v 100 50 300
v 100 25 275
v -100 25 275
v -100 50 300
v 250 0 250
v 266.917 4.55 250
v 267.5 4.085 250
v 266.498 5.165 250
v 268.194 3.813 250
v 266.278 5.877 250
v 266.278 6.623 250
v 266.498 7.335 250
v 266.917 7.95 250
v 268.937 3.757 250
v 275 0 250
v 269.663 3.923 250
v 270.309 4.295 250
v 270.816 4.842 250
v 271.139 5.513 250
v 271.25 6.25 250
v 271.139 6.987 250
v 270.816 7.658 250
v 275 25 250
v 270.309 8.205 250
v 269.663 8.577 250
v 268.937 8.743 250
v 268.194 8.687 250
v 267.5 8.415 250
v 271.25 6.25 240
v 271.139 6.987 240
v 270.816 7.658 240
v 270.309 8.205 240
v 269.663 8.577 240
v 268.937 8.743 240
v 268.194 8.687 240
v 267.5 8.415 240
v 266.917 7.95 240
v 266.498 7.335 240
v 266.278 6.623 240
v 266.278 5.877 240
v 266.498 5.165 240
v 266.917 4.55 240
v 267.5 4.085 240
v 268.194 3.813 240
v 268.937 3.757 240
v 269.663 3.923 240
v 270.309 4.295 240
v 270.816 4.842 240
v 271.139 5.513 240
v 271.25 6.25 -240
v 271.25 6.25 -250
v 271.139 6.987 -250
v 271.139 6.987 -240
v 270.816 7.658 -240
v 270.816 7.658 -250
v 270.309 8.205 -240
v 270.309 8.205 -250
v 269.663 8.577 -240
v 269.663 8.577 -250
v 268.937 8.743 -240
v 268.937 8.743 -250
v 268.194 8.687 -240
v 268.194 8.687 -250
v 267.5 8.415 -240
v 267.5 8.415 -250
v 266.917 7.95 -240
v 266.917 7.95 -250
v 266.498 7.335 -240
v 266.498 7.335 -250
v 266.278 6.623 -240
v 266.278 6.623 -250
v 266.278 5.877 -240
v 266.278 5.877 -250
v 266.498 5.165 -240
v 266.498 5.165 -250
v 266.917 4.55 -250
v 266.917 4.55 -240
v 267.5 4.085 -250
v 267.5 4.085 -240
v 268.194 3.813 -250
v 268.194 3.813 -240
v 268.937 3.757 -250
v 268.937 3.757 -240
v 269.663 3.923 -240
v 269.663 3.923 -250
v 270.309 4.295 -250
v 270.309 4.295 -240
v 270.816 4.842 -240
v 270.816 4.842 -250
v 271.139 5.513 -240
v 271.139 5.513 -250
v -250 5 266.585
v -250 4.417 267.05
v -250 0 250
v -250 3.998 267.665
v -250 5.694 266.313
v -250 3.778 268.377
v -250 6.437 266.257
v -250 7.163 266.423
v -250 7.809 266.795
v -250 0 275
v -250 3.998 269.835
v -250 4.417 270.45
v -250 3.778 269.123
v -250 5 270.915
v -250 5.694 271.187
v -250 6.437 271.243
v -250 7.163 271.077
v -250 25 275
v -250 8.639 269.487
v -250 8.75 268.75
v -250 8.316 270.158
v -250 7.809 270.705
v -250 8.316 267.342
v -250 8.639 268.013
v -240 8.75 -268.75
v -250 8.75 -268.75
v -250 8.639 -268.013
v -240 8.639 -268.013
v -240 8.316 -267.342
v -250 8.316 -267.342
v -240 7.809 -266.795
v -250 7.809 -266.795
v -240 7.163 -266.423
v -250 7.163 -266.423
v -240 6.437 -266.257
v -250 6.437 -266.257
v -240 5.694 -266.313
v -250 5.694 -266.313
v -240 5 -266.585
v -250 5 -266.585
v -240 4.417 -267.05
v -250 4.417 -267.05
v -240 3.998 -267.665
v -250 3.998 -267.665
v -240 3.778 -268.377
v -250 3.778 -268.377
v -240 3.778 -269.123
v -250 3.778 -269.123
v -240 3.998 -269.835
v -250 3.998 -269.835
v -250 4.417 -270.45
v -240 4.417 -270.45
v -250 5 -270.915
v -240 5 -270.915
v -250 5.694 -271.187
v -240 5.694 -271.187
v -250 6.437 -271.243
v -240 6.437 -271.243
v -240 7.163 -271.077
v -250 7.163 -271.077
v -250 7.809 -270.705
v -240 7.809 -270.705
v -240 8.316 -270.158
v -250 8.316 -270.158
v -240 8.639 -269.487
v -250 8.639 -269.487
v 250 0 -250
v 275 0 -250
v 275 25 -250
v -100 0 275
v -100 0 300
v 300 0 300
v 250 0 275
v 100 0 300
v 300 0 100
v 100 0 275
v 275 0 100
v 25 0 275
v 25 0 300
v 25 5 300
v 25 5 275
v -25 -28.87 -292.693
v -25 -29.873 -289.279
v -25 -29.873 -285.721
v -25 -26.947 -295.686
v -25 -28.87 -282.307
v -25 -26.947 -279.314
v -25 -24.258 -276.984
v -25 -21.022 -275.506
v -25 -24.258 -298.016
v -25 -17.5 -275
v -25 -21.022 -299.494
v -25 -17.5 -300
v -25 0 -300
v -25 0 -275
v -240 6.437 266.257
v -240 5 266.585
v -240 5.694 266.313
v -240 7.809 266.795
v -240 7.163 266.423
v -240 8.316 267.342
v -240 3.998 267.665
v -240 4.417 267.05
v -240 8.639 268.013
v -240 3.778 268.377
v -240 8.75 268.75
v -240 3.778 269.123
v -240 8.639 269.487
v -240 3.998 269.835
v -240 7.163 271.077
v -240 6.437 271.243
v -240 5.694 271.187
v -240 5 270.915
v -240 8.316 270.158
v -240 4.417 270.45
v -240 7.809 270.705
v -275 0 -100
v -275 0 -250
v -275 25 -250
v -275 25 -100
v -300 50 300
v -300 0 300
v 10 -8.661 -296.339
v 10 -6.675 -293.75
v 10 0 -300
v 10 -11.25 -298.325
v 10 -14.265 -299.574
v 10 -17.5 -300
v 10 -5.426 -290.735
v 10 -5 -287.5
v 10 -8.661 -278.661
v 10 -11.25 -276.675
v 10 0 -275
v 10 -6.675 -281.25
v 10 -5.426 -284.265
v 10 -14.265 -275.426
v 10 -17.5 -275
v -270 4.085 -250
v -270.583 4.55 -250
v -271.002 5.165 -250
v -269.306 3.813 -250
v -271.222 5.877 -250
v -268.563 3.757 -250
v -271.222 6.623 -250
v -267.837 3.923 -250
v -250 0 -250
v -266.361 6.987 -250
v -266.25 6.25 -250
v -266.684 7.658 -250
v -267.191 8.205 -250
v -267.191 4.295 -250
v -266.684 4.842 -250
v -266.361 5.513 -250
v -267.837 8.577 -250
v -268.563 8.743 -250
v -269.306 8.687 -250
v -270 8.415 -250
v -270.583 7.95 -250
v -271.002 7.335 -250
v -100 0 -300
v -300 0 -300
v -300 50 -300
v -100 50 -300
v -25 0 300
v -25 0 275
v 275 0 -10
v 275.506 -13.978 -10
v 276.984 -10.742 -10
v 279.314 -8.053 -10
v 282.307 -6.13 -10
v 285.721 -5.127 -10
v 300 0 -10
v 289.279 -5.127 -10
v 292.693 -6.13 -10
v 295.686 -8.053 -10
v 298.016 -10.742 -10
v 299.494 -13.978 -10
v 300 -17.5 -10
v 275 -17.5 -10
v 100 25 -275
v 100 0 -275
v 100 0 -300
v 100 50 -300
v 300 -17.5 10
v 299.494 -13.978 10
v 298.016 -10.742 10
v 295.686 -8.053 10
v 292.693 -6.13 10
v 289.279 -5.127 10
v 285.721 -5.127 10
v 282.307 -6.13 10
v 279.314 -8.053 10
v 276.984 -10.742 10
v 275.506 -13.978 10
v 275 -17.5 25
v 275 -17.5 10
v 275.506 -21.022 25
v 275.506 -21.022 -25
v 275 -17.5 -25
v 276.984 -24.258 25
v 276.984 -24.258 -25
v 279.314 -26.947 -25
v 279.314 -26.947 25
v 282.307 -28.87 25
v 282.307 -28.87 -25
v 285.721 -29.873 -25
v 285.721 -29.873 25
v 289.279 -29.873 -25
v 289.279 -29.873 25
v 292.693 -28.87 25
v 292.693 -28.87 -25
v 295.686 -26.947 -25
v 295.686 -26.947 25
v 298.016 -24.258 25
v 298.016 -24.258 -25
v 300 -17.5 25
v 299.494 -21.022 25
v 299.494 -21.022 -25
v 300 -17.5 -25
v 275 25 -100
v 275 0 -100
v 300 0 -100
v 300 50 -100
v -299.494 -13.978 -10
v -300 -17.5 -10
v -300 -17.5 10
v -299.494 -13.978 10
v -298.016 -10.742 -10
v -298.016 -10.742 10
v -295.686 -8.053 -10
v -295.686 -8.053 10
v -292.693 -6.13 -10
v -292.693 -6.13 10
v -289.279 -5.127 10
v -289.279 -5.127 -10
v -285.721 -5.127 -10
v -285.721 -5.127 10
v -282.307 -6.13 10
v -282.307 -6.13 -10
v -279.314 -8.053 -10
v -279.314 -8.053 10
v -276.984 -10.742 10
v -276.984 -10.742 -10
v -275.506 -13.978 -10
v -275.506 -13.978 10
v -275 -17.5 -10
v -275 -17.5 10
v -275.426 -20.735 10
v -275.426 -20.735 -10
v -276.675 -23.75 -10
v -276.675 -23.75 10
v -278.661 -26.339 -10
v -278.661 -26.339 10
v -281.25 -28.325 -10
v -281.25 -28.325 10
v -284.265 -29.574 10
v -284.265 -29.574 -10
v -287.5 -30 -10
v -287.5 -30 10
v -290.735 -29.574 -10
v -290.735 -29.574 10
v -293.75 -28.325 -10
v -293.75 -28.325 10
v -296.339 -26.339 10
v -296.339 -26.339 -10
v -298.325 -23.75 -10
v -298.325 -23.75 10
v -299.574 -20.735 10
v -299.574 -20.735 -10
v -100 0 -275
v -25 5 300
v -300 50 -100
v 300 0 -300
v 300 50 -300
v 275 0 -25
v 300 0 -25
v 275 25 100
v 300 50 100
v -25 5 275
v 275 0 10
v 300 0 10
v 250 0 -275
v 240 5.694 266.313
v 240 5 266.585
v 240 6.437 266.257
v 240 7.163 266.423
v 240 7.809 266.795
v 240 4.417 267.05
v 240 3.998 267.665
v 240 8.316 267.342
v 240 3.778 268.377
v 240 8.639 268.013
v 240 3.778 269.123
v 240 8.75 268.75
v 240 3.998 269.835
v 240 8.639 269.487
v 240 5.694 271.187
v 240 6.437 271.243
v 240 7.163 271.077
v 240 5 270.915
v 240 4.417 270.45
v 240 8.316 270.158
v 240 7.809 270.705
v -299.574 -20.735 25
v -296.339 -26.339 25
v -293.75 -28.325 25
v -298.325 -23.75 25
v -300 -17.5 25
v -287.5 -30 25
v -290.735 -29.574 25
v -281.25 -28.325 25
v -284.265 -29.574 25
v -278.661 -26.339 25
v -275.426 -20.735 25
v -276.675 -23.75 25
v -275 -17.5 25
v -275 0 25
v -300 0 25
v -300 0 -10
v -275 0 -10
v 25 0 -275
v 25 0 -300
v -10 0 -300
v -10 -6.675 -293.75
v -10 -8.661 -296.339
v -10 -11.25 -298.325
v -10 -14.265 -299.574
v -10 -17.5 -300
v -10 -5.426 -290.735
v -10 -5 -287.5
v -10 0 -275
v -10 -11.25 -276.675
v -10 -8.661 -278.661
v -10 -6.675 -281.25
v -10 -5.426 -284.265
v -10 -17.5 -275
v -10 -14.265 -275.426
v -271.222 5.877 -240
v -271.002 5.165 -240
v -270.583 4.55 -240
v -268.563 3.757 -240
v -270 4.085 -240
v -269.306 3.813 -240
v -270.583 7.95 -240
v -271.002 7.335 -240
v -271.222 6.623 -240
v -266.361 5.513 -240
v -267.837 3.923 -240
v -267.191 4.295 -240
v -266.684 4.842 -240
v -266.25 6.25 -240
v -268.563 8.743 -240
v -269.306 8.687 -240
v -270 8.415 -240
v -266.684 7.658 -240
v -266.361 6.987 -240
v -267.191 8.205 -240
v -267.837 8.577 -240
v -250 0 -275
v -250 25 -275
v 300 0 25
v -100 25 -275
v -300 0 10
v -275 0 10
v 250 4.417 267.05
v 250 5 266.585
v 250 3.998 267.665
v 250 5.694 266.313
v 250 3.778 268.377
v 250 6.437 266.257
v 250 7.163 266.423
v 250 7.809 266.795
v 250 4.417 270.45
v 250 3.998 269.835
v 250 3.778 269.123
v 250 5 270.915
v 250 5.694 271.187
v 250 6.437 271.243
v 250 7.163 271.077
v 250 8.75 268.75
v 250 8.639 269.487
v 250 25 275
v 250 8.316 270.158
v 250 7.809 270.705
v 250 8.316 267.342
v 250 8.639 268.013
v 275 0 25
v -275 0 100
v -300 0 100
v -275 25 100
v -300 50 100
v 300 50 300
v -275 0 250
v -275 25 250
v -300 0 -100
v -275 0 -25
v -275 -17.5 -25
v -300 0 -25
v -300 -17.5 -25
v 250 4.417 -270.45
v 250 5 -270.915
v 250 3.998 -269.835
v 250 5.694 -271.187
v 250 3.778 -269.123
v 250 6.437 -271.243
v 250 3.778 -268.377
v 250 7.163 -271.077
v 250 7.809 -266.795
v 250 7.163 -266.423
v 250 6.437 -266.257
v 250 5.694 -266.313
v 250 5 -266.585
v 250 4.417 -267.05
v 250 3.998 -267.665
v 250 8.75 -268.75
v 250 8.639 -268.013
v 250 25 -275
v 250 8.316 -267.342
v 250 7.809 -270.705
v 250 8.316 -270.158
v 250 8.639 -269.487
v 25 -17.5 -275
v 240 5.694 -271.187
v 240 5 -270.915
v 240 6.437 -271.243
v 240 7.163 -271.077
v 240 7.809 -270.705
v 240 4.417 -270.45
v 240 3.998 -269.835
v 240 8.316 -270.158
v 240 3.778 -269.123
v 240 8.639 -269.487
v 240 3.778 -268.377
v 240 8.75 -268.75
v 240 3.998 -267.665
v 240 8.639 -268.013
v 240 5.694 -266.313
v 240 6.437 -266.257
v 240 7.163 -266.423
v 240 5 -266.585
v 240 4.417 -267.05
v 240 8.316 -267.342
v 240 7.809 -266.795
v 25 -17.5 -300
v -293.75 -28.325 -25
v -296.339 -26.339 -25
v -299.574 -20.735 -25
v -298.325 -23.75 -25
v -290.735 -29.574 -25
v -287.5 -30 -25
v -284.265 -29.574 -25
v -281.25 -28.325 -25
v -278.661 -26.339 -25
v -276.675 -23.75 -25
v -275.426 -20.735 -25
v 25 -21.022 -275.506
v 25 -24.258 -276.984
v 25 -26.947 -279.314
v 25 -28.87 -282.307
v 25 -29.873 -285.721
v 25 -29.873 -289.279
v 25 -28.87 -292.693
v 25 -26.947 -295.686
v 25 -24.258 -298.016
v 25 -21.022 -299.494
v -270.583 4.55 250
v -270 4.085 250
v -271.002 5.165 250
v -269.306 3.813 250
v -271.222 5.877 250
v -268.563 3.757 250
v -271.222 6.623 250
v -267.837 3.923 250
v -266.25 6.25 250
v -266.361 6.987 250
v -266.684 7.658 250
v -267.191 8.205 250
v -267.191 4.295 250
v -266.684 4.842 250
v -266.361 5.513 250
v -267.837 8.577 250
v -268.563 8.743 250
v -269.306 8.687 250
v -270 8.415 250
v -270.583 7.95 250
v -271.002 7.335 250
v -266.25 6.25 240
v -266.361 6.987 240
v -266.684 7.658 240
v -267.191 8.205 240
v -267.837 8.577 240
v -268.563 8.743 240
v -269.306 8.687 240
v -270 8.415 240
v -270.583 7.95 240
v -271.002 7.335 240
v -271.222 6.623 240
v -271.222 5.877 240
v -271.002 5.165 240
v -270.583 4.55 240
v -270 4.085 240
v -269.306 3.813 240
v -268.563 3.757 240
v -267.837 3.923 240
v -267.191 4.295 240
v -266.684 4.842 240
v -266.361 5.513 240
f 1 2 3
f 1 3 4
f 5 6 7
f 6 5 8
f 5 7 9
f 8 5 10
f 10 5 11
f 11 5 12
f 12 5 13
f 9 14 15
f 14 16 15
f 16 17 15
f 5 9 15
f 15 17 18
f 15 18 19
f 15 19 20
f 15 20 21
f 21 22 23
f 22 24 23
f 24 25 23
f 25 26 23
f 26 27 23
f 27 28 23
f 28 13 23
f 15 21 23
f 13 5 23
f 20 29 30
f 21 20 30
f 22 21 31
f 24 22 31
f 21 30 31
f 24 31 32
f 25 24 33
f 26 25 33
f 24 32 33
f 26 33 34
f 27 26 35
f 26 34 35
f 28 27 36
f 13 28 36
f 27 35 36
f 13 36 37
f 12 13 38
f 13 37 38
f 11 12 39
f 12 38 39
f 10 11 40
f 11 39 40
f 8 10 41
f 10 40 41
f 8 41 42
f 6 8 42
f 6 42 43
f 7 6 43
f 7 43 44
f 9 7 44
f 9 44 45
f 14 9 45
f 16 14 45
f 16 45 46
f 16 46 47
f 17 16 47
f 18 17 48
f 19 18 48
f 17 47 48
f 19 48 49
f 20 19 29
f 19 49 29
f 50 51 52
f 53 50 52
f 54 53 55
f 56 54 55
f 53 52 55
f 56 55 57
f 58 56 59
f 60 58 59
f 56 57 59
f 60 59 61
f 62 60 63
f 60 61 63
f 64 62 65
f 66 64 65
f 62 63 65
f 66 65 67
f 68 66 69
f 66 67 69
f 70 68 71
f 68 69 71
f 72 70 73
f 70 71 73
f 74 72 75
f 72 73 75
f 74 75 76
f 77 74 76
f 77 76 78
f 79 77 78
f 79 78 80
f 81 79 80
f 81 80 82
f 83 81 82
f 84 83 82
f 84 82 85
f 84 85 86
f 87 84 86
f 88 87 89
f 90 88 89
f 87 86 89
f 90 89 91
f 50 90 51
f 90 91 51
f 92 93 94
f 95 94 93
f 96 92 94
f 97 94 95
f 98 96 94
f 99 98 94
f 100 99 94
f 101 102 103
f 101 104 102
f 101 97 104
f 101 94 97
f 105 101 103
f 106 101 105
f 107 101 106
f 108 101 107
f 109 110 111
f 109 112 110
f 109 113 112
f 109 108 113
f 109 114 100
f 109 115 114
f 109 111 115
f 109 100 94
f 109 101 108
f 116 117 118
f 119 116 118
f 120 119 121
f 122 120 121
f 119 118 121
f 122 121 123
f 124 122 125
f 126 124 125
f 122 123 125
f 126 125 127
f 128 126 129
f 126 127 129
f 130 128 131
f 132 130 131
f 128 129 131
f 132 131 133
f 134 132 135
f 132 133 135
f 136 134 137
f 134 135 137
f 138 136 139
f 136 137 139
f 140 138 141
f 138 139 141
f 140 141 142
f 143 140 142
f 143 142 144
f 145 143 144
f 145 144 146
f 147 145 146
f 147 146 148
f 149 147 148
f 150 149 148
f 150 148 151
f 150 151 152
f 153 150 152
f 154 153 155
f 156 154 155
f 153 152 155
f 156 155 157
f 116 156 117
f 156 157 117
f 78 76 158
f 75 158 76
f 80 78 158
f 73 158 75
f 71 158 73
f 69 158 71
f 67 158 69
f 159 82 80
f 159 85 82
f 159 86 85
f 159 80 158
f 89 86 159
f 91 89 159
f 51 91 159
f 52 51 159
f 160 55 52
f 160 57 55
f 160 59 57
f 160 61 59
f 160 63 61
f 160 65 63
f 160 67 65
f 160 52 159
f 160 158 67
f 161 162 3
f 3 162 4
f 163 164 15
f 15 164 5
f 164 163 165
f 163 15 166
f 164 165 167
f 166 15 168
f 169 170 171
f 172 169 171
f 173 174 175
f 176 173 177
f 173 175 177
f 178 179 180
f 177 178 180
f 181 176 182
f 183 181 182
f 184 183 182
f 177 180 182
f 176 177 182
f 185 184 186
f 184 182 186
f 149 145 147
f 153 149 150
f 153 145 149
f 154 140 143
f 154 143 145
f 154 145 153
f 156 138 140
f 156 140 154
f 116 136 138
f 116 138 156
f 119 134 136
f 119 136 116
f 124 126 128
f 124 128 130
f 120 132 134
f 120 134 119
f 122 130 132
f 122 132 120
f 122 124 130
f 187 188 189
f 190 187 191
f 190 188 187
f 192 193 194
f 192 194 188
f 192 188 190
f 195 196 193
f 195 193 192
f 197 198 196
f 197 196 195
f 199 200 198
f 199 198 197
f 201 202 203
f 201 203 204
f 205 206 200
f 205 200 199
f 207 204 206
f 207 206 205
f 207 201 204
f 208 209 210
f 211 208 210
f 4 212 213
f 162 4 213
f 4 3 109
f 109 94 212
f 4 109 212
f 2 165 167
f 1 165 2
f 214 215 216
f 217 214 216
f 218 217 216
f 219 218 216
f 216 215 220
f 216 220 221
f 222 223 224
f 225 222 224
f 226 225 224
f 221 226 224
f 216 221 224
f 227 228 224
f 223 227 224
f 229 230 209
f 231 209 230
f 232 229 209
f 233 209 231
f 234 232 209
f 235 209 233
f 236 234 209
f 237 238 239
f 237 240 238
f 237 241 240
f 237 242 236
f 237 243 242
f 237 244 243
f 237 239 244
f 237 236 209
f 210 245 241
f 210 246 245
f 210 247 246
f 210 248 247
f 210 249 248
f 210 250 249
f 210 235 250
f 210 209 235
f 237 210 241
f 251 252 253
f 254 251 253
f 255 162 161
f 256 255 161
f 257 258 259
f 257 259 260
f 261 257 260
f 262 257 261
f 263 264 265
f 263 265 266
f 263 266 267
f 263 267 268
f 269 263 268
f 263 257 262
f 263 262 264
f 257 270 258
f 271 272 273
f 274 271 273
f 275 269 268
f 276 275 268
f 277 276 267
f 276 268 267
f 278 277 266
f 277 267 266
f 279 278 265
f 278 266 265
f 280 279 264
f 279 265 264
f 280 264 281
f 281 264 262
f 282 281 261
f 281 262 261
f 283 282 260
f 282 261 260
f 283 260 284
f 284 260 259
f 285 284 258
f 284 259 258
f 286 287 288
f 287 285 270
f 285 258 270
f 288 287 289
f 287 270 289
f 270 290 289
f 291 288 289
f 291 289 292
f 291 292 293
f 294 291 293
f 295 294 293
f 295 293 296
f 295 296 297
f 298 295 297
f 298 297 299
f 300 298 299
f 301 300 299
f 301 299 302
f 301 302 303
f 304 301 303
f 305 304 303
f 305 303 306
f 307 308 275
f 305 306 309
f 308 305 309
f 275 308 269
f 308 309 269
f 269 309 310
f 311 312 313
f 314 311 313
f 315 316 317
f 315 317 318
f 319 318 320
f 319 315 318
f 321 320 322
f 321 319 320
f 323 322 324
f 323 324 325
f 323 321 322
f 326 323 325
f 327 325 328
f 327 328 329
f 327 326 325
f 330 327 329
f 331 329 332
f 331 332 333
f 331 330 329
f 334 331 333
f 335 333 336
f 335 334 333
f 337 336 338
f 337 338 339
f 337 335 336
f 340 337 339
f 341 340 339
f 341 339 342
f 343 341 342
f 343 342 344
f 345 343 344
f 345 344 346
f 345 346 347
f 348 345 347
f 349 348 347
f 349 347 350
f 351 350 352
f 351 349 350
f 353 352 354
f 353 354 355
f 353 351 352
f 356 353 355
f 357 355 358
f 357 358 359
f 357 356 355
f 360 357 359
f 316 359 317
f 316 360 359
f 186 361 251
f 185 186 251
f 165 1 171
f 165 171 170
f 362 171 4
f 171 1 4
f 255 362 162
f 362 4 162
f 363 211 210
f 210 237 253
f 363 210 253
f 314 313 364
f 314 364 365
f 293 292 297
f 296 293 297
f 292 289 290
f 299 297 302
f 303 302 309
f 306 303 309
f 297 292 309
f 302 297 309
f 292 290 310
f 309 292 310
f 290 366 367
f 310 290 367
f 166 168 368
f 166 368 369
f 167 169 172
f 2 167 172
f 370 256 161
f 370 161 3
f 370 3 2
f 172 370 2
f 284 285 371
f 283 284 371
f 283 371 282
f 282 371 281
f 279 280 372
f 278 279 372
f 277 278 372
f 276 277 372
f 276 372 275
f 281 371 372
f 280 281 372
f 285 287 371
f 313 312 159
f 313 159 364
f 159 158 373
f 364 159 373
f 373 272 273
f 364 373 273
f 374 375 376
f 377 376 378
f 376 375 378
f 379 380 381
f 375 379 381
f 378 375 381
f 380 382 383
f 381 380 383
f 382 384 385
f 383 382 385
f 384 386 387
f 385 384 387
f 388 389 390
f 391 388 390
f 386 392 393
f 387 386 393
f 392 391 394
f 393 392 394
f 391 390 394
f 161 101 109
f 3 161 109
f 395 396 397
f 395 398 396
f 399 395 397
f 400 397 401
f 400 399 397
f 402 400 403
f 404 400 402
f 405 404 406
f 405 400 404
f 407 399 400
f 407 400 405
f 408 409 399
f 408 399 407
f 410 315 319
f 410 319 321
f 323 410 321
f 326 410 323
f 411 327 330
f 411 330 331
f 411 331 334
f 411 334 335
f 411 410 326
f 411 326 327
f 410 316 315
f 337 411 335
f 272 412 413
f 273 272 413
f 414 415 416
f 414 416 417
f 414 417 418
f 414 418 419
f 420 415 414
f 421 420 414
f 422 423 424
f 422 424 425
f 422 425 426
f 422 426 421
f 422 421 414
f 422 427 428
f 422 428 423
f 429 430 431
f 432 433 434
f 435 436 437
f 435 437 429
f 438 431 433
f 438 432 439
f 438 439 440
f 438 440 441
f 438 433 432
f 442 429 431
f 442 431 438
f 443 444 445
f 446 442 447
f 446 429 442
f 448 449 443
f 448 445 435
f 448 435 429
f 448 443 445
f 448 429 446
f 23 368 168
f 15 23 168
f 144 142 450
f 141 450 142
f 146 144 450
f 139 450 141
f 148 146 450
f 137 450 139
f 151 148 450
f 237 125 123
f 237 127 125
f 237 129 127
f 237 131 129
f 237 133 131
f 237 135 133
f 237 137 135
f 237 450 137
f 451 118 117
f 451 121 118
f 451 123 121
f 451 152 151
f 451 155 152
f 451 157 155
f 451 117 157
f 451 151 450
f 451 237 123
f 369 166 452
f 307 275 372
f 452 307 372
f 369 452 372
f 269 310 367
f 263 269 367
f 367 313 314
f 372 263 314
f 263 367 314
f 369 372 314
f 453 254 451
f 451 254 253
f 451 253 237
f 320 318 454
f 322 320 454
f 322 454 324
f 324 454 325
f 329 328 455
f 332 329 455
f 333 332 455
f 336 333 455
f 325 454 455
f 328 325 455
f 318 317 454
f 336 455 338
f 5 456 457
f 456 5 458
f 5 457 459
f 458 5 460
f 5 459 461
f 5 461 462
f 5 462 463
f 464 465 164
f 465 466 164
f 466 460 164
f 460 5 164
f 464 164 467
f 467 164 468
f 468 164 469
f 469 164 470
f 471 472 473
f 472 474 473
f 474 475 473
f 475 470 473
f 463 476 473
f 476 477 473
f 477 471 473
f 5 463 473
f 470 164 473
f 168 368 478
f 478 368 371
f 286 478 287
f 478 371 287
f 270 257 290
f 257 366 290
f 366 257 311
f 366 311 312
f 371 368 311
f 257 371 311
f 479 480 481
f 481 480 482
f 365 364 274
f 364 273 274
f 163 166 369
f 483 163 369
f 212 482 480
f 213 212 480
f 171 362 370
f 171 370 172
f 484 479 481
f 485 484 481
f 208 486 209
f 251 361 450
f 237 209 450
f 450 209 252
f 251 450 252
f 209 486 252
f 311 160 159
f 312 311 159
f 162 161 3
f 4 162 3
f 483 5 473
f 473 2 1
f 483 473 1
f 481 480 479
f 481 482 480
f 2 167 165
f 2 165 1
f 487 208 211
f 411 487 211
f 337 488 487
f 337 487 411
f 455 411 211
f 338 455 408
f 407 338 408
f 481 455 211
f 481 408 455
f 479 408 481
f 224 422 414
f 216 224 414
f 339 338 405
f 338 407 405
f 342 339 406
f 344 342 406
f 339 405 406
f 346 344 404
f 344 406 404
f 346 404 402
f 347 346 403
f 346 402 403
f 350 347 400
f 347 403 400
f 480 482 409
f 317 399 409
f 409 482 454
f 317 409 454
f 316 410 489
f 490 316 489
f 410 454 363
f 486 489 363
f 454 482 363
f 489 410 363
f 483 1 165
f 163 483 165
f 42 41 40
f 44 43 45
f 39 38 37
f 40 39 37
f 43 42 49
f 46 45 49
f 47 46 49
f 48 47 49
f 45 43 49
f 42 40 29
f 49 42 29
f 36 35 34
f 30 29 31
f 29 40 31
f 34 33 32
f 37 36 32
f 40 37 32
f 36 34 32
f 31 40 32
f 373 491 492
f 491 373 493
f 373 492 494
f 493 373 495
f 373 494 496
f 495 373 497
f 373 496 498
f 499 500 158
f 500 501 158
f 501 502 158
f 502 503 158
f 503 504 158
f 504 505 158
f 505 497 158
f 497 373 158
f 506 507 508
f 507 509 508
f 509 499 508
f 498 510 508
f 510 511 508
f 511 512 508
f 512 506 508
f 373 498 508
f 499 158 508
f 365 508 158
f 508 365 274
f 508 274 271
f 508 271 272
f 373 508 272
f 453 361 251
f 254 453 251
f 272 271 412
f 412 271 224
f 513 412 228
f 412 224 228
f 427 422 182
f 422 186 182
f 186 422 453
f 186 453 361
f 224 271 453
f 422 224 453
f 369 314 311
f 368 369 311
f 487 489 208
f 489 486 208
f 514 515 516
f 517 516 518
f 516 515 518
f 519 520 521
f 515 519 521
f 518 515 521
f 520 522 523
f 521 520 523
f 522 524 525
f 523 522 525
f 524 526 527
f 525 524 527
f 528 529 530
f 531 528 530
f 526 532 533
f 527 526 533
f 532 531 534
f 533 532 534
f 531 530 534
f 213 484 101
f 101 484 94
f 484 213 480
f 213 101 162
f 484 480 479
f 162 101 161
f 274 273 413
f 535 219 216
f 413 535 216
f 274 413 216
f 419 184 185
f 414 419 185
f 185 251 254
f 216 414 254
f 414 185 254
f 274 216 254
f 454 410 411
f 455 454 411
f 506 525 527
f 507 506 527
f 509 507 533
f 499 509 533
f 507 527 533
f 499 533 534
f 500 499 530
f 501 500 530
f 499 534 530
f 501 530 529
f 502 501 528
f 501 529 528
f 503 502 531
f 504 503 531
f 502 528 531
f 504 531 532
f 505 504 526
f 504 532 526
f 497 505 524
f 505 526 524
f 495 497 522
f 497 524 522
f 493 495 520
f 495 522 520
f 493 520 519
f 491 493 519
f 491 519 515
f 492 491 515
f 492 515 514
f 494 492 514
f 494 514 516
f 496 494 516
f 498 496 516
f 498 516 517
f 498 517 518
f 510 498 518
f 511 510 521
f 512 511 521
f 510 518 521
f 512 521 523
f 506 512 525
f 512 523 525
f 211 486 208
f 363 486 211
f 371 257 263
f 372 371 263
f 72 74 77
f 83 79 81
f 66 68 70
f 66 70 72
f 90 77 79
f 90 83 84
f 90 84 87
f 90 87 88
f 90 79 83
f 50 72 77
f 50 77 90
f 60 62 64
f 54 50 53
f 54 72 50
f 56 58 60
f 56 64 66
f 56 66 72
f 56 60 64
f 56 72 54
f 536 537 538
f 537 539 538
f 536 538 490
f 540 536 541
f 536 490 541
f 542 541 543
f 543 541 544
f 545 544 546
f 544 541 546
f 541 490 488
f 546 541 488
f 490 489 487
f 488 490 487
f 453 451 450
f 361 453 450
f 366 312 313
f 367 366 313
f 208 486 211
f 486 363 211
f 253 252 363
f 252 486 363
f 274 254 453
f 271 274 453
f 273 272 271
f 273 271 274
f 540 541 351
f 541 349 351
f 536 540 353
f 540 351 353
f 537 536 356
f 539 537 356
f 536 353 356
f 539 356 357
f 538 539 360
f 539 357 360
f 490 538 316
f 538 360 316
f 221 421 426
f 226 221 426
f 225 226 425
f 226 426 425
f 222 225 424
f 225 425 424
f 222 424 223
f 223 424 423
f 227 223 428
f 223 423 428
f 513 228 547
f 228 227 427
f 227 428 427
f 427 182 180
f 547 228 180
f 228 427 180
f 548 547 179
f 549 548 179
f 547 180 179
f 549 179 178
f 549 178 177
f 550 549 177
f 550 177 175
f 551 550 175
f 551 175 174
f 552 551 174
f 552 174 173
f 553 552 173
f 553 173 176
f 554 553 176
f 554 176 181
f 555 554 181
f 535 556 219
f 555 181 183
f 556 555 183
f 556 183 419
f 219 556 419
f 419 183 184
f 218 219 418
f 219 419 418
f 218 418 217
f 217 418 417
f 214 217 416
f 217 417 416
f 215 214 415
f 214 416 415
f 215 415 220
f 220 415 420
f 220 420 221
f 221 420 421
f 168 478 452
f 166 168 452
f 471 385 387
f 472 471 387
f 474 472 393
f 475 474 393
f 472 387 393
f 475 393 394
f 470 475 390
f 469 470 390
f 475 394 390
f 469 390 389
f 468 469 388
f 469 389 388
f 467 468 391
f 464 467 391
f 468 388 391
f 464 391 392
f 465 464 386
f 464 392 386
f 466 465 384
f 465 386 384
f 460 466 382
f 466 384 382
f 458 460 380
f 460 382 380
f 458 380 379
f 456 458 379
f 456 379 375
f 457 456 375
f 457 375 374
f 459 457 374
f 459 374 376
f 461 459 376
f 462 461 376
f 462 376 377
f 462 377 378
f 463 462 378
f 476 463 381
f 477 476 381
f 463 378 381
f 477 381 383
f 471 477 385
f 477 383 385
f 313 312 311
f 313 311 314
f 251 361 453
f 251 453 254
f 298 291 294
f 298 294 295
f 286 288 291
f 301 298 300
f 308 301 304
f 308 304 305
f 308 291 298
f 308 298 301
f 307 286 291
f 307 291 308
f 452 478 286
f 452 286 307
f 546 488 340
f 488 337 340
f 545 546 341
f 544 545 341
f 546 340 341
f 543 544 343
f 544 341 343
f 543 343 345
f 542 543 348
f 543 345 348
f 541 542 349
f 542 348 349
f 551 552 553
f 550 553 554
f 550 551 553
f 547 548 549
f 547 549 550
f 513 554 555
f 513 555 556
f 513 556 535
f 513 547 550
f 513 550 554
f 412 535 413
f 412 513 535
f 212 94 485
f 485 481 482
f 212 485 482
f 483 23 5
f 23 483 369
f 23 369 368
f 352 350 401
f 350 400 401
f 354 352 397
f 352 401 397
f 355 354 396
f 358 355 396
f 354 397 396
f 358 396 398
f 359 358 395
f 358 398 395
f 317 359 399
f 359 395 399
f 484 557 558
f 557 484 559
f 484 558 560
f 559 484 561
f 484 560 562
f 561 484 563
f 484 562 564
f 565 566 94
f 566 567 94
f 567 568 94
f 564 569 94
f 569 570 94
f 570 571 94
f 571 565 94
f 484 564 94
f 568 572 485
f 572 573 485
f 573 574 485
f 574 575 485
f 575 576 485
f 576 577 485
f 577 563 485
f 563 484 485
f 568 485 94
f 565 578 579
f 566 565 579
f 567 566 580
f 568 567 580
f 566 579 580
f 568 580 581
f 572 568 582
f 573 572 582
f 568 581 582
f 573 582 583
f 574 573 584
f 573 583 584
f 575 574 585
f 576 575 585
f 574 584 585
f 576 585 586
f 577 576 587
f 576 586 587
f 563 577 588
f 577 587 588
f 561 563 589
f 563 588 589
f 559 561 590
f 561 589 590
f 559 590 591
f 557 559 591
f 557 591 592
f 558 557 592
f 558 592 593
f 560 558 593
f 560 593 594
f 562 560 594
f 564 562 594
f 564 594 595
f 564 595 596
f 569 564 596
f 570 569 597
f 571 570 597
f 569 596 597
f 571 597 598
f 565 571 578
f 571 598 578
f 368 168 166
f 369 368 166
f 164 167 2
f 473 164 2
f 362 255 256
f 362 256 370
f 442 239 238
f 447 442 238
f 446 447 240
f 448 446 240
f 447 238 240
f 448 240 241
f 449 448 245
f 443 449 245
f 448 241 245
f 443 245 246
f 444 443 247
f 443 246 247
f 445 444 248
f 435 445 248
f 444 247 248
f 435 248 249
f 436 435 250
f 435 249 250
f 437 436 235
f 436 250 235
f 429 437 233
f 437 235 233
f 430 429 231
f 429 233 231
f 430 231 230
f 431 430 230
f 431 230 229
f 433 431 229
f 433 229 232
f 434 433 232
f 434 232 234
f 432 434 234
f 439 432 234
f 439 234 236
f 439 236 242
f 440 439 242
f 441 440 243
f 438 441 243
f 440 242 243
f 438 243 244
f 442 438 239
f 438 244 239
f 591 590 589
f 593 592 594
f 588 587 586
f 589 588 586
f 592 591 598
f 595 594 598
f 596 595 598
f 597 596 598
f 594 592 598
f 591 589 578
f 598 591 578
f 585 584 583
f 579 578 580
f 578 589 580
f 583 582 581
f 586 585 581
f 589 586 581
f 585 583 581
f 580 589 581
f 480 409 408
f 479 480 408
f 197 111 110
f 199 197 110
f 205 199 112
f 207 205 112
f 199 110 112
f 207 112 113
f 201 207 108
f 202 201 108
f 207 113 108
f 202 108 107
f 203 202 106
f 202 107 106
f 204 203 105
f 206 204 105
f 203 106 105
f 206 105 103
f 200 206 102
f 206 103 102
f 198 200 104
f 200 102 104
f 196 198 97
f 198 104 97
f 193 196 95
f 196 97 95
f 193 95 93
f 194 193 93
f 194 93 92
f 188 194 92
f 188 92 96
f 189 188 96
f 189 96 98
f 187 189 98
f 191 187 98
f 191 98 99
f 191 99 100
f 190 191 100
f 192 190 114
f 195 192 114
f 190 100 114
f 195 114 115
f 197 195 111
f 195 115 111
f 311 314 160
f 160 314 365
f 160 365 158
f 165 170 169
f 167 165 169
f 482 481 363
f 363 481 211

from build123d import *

# Parameters (mm, degrees)
SKETCH1_W                                  = 700
SKETCH1_H                                  = 700
SKETCH1_W_2                                = 500
SKETCH1_H_2                                = 500
BOSS_EXTRUDE2_DEPTH                        = 50
BOSS_EXTRUDE2_DRAFT                        = 45
SKETCH6_W                                  = 700
SKETCH6_H                                  = 700
SKETCH6_W_2                                = 600
SKETCH6_H_2                                = 600
CUT_EXTRUDE1_DEPTH                         = 50
CUT_EXTRUDE2_DEPTH                         = 25
SKETCH8_R                                  = 2.5
BOSS_EXTRUDE3_DEPTH                        = 10
MIRROR1_AT_THE_SECOND_PLANE_COPY_1_SKETC_R = 2.5
MIRROR1_AT_THE_SECOND_PLANE_COPY_1_DEPTH   = 10
MIRROR2_COPY_1_SKETCH_R                    = 2.5
MIRROR2_COPY_1_DEPTH                       = 10
MIRROR2_COPY_2_SKETCH_R                    = 2.5
MIRROR2_COPY_2_DEPTH                       = 10
MIRROR2_COPY_3_SKETCH_R                    = 2.5
MIRROR2_COPY_3_DEPTH                       = 10
SKETCH9_W                                  = 25
SKETCH9_H                                  = 15
BOSS_EXTRUDE4_DEPTH                        = 30
SKETCH11_R                                 = 12.5
BOSS_EXTRUDE5_DEPTH                        = 50
FILLET1_R                                  = 12.5
FILLET1_OF_MIRROR3_R                       = 12.5
MIRROR4_START                              = -25
MIRROR4_OUTLINE_R                          = 12.5
MIRROR4_DEPTH                              = 50
MIRROR4_2_DEPTH                            = 15
MIRROR4_START_2                            = 10
MIRROR4_3_DEPTH                            = 15
INTERSECT1_START                           = -300
INTERSECT1_DEPTH                           = 200
INTERSECT1_2_DEPTH                         = 50
INTERSECT1_START_2                         = -250
INTERSECT1_3_OUTLINE_R                     = 2.5
INTERSECT1_3_DEPTH                         = 10
INTERSECT1_4_DEPTH                         = 200
INTERSECT1_START_3                         = -279.452
INTERSECT1_5_DEPTH                         = 29.452
INTERSECT1_6_OUTLINE_R                     = 2.5
INTERSECT1_6_DEPTH                         = 10
INTERSECT1_7_DEPTH                         = 600
INTERSECT1_8_DEPTH                         = 200
INTERSECT1_START_4                         = 100
INTERSECT1_9_DEPTH                         = 200
INTERSECT1_START_5                         = -100
INTERSECT1_10_DEPTH                        = 200
INTERSECT1_START_6                         = -25
INTERSECT1_11_OUTLINE_R                    = 12.5
INTERSECT1_11_DEPTH                        = 50
INTERSECT1_12_DEPTH                        = 15
INTERSECT1_START_7                         = 10
INTERSECT1_13_DEPTH                        = 15
INTERSECT1_14_DEPTH                        = 200
INTERSECT1_START_8                         = 250
INTERSECT1_15_DEPTH                        = 50
INTERSECT1_START_9                         = 240
INTERSECT1_16_OUTLINE_R                    = 2.5
INTERSECT1_16_DEPTH                        = 10
INTERSECT1_17_DEPTH                        = 200
INTERSECT1_START_10                        = -280.548
INTERSECT1_18_DEPTH                        = 30.548
INTERSECT1_19_OUTLINE_R                    = 2.5
INTERSECT1_19_DEPTH                        = 10
INTERSECT1_20_DEPTH                        = 200
INTERSECT1_21_OUTLINE_R                    = 12.5
INTERSECT1_21_DEPTH                        = 50
INTERSECT1_22_DEPTH                        = 15
INTERSECT1_23_DEPTH                        = 15
INTERSECT1_24_DEPTH                        = 200
INTERSECT1_25_OUTLINE_R                    = 12.5
INTERSECT1_25_DEPTH                        = 50
INTERSECT1_26_DEPTH                        = 15
INTERSECT1_27_DEPTH                        = 15
INTERSECT1_28_DEPTH                        = 200
INTERSECT1_29_DEPTH                        = 50
INTERSECT1_30_OUTLINE_R                    = 2.5
INTERSECT1_30_DEPTH                        = 10
INTERSECT1_31_DEPTH                        = 200
INTERSECT1_32_DEPTH                        = 30.548
INTERSECT1_33_OUTLINE_R                    = 2.5
INTERSECT1_33_DEPTH                        = 10
INTERSECT1_34_DEPTH                        = 200
INTERSECT1_35_DEPTH                        = 50
INTERSECT1_36_OUTLINE_R                    = 2.5
INTERSECT1_36_DEPTH                        = 10
INTERSECT1_37_DEPTH                        = 200
INTERSECT1_38_DEPTH                        = 30.548
INTERSECT1_39_OUTLINE_R                    = 2.5
INTERSECT1_39_DEPTH                        = 10
SKETCH20_W                                 = 50
SKETCH20_H                                 = 35
CUT_EXTRUDE3_DEPTH                         = 100


with BuildPart() as part:
    # Sketch1 → Boss-Extrude2 (with draft: the straight prism first)
    with BuildSketch(Plane(origin=(0, 0, 0), x_dir=(1, 0, 0), z_dir=(0, 1, 0))):
        Rectangle(SKETCH1_W, SKETCH1_H)
        Rectangle(SKETCH1_W_2, SKETCH1_H_2, mode=Mode.SUBTRACT)
    extrude(amount=BOSS_EXTRUDE2_DEPTH)
    # Boss-Extrude2: the draft: its side faces are tilted about the plane it starts from
    boss_extrude2_sides = [part.faces().sort_by_distance(p)[0] for p in [
        (-350, 25, 0),
        (0, 25, 350),
        (350, 25, 0),
        (0, 25, -350),
        (250, 25, 0),
        (0, 25, 250),
        (-250, 25, 0),
        (0, 25, -250),
    ]]
    draft(boss_extrude2_sides, Plane(origin=(0, 0, 0), x_dir=(1, 0, 0), z_dir=(0, 1, 0)), BOSS_EXTRUDE2_DRAFT)

    # Sketch6 → Cut-Extrude1 (cut)
    with BuildSketch(Plane(origin=(0, 50, 0), x_dir=(1, 0, 0), z_dir=(0, 1, 0))):
        Rectangle(SKETCH6_W, SKETCH6_H)
        Rectangle(SKETCH6_W_2, SKETCH6_H_2, mode=Mode.SUBTRACT)
    extrude(amount=-CUT_EXTRUDE1_DEPTH, mode=Mode.SUBTRACT)

    # Sketch7 → Cut-Extrude2 (cut)
    with BuildSketch(Plane.XZ):
        Polygon((-275, 250), (-250, 250), (-250, 275), (250, 275), (250, 250), (275, 250), (275, -250), (250, -250), (250, -275), (-250, -275), (-250, -250), (-275, -250), align=None)
    extrude(amount=-CUT_EXTRUDE2_DEPTH, mode=Mode.SUBTRACT)

    # Sketch8 → Boss-Extrude3 (add)
    with BuildSketch(Plane.XY.offset(-250)):
        with Locations(Location((-268.75, 6.25, 0), (0, 0, 180))):
            Circle(SKETCH8_R)
    boss_extrude3 = extrude(amount=BOSS_EXTRUDE3_DEPTH)

    # Mirror1: Boss-Extrude3 across plane
    add(boss_extrude3.mirror(Plane(origin=(0, 0, 0), x_dir=(0, 0, 1), z_dir=(1, 0, 0))))

    # Mirror1 at the second plane: Boss-Extrude3 across plane
    add(boss_extrude3.mirror(Plane.XY))

    # Mirror1 at the second plane copy 1 sketc → Mirror1 at the second plane copy 1 (add)
    with BuildSketch(Plane(origin=(0, 0, 250), x_dir=(-1, 0, 0), z_dir=(0, 0, -1))):
        with Locations(Location((-268.75, 6.25, 0), (0, 0, 180))):
            Circle(MIRROR1_AT_THE_SECOND_PLANE_COPY_1_SKETC_R)
    extrude(amount=MIRROR1_AT_THE_SECOND_PLANE_COPY_1_DEPTH)

    # Mirror2: Boss-Extrude3 across plane
    add(boss_extrude3.mirror(Plane(origin=(0, 0, 0), x_dir=(0.7071067811865477, 0, 0.7071067811865474), z_dir=(-0.7071067811865474, 0, 0.7071067811865477))))

    # Mirror2 copy 1 sketch → Mirror2 copy 1 (add)
    with BuildSketch(Plane(origin=(-250, 0, 0), x_dir=(0, 0, -1), z_dir=(1, 0, 0))):
        with Locations(Location((-268.75, 6.25, 0), (0, 0, 180))):
            Circle(MIRROR2_COPY_1_SKETCH_R)
    extrude(amount=MIRROR2_COPY_1_DEPTH)

    # Mirror2 copy 2 sketch → Mirror2 copy 2 (add)
    with BuildSketch(Plane.ZY.offset(-250)):
        with Locations(Location((-268.75, 6.25, 0), (0, 0, 180))):
            Circle(MIRROR2_COPY_2_SKETCH_R)
    extrude(amount=MIRROR2_COPY_2_DEPTH)

    # Mirror2 copy 3 sketch → Mirror2 copy 3 (add)
    with BuildSketch(Plane(origin=(250, 0, 0), x_dir=(0, 0, -1), z_dir=(-1, 0, 0))):
        with Locations((-268.75, -6.25)):
            Circle(MIRROR2_COPY_3_SKETCH_R)
    extrude(amount=MIRROR2_COPY_3_DEPTH)

    # Sketch9 → Boss-Extrude4 (add)
    with BuildSketch(Plane.XZ):
        with Locations((-287.5, 17.5)):
            Rectangle(SKETCH9_W, SKETCH9_H)
        with Locations((-287.5, -17.5)):
            Rectangle(SKETCH9_W, SKETCH9_H)
    boss_extrude4 = extrude(amount=BOSS_EXTRUDE4_DEPTH)

    # Sketch11 → Boss-Extrude5 (add)
    with BuildSketch(Plane(origin=(0, 0, -25), x_dir=(-1, 0, 0), z_dir=(0, 0, -1))):
        with Locations((287.5, -17.5)):
            Circle(SKETCH11_R)
    boss_extrude5 = extrude(amount=-BOSS_EXTRUDE5_DEPTH)

    # Fillet1
    fillet1_edges = [part.edges().sort_by_distance(p)[0] for p in [
        (-275, -30, -17.5),
        (-275, -30, 17.5),
        (-300, -30, 17.5),
        (-300, -30, -17.5),
    ]]
    fillet(fillet1_edges, radius=FILLET1_R - 0.0001)  # a hair under: the kernel refuses the full size

    # Mirror3: Boss-Extrude4, Boss-Extrude5 across plane
    add(boss_extrude4.mirror(Plane(origin=(0, 0, 0), x_dir=(0, 0, 1), z_dir=(1, 0, 0))))
    add(boss_extrude5.mirror(Plane(origin=(0, 0, 0), x_dir=(0, 0, 1), z_dir=(1, 0, 0))))

    # Fillet1 of Mirror3
    fillet1_of_mirror3_edges = [part.edges().sort_by_distance(p)[0] for p in [
        (275, -30, -17.5),
        (275, -30, 17.5),
        (300, -30, 17.5),
        (300, -30, -17.5),
    ]]
    fillet(fillet1_of_mirror3_edges, radius=FILLET1_OF_MIRROR3_R - 0.0001)  # a hair under: the kernel refuses the full size



with BuildPart() as body_2:
    # Mirror4: read off the stored shape, not the designer's step
    # Mirror4 outline → Mirror4 (new body)
    with BuildSketch(Plane.YZ.offset(MIRROR4_START)):
        with Locations((-17.5, 287.5)):
            Circle(MIRROR4_OUTLINE_R)
        with Locations((-17.5, -287.5)):
            Circle(MIRROR4_OUTLINE_R)
    extrude(amount=MIRROR4_DEPTH)


with BuildPart() as part_1:
    add(part.part)

    add(body_2.part)  # Mirror4 2 merges body 2
    # Mirror4 2 outline → Mirror4 2 (add)
    with BuildSketch(Plane.YZ.offset(MIRROR4_START)):
        with BuildLine():
            ThreePointArc((-17.5, 300), (-5, 287.5), (-17.5, 275))
            Line((-17.5, 275), (0, 275))
            Line((0, 275), (0, 300))
            Line((0, 300), (-17.5, 300))
        make_face()
        with BuildLine():
            ThreePointArc((-17.5, -275), (-5, -287.5), (-17.5, -300))
            Line((-17.5, -300), (0, -300))
            Line((0, -300), (0, -275))
            Line((0, -275), (-17.5, -275))
        make_face()
    extrude(amount=MIRROR4_2_DEPTH)

    # Mirror4 3 outline → Mirror4 3 (add)
    with BuildSketch(Plane.YZ.offset(MIRROR4_START_2)):
        with BuildLine():
            ThreePointArc((-17.5, 300), (-5, 287.5), (-17.5, 275))
            Line((-17.5, 275), (0, 275))
            Line((0, 275), (0, 300))
            Line((0, 300), (-17.5, 300))
        make_face()
        with BuildLine():
            ThreePointArc((-17.5, -275), (-5, -287.5), (-17.5, -300))
            Line((-17.5, -300), (0, -300))
            Line((0, -300), (0, -275))
            Line((0, -275), (-17.5, -275))
        make_face()
    extrude(amount=MIRROR4_3_DEPTH)

    # Intersect1 7 outline → Intersect1 7 (cut)
    with BuildSketch(Plane.XY.offset(INTERSECT1_START)):
        Polygon((302, 52), (-302, 52), (-302, 0), (-300, 0), (-300, 50), (-275, 25), (-275, -32), (302, -32), align=None)
    extrude(amount=INTERSECT1_7_DEPTH, mode=Mode.SUBTRACT)

    # Intersect1 8 outline → Intersect1 8 (cut)
    with BuildSketch(Plane.XY.offset(INTERSECT1_START)):
        Polygon((-300, 0), (-275, 0), (-275, 25), (-300, 50), align=None)
    extrude(amount=INTERSECT1_8_DEPTH, mode=Mode.SUBTRACT)

    # Intersect1 9 outline → Intersect1 9 (cut)
    with BuildSketch(Plane.XY.offset(INTERSECT1_START_4)):
        Polygon((-300, 0), (-275, 0), (-275, 25), (-300, 50), align=None)
    extrude(amount=INTERSECT1_9_DEPTH, mode=Mode.SUBTRACT)


with BuildPart() as body_2_2:
    # Intersect1: read off the stored shape, not the designer's step
    # Intersect1 outline → Intersect1 (new body)
    with BuildSketch(Plane.YZ.offset(INTERSECT1_START)):
        Polygon((0, -275), (0, -300), (50, -300), (25, -275), align=None)
    extrude(amount=INTERSECT1_DEPTH)

    # Intersect1 2 outline → Intersect1 2 (add)
    with BuildSketch(Plane.YZ.offset(INTERSECT1_START)):
        Polygon((0, -250), (0, -275), (25, -275), align=None)
    extrude(amount=INTERSECT1_2_DEPTH)

    # Intersect1 3 outline → Intersect1 3 (add)
    with BuildSketch(Plane.YZ.offset(INTERSECT1_START_2)):
        with Locations((6.25, -268.75)):
            Circle(INTERSECT1_3_OUTLINE_R)
    extrude(amount=INTERSECT1_3_DEPTH)

    # Intersect1 4 outline → Intersect1 4 (add)
    with BuildSketch(Plane.XY.offset(INTERSECT1_START)):
        Polygon((-275, 25), (-300, 50), (-300, 0), (-275, 0), align=None)
    extrude(amount=INTERSECT1_4_DEPTH)

    # Intersect1 5 outline → Intersect1 5 (add)
    with BuildSketch(Plane.XY.offset(INTERSECT1_START_3)):
        Polygon((-250, 0), (-275, 25), (-275, 0), align=None)
    extrude(amount=INTERSECT1_5_DEPTH)

    # Intersect1 6 outline → Intersect1 6 (add)
    with BuildSketch(Plane.XY.offset(INTERSECT1_START_2)):
        with Locations((-268.75, 6.25)):
            Circle(INTERSECT1_6_OUTLINE_R)
    extrude(amount=INTERSECT1_6_DEPTH)


with BuildPart() as body_3:
    # Intersect1 10 outline → Intersect1 10 (new body)
    with BuildSketch(Plane.YZ.offset(INTERSECT1_START_5)):
        Polygon((0, -275), (0, -300), (50, -300), (25, -275), align=None)
    extrude(amount=INTERSECT1_10_DEPTH)

    # Intersect1 11 outline → Intersect1 11 (add)
    with BuildSketch(Plane.YZ.offset(INTERSECT1_START_6)):
        with Locations((-17.5, -287.5)):
            Circle(INTERSECT1_11_OUTLINE_R)
    extrude(amount=INTERSECT1_11_DEPTH)

    # Intersect1 12 outline → Intersect1 12 (add)
    with BuildSketch(Plane.YZ.offset(INTERSECT1_START_6)):
        with BuildLine():
            Line((-17.5, -300), (0, -300))
            Line((0, -300), (0, -275))
            Line((0, -275), (-17.5, -275))
            ThreePointArc((-17.5, -275), (-5, -287.5), (-17.5, -300))
        make_face()
    extrude(amount=INTERSECT1_12_DEPTH)

    # Intersect1 13 outline → Intersect1 13 (add)
    with BuildSketch(Plane.YZ.offset(INTERSECT1_START_7)):
        with BuildLine():
            Line((-17.5, -300), (0, -300))
            Line((0, -300), (0, -275))
            Line((0, -275), (-17.5, -275))
            ThreePointArc((-17.5, -275), (-5, -287.5), (-17.5, -300))
        make_face()
    extrude(amount=INTERSECT1_13_DEPTH)


with BuildPart() as body_4:
    # Intersect1 14 outline → Intersect1 14 (new body)
    with BuildSketch(Plane.YZ.offset(INTERSECT1_START_4)):
        Polygon((0, -275), (0, -300), (50, -300), (25, -275), align=None)
    extrude(amount=INTERSECT1_14_DEPTH)

    # Intersect1 15 outline → Intersect1 15 (add)
    with BuildSketch(Plane.YZ.offset(INTERSECT1_START_8)):
        Polygon((0, -250), (0, -275), (25, -275), align=None)
    extrude(amount=INTERSECT1_15_DEPTH)

    # Intersect1 16 outline → Intersect1 16 (add)
    with BuildSketch(Plane.YZ.offset(INTERSECT1_START_9)):
        with Locations((6.25, -268.75)):
            Circle(INTERSECT1_16_OUTLINE_R)
    extrude(amount=INTERSECT1_16_DEPTH)

    # Intersect1 17 outline → Intersect1 17 (add)
    with BuildSketch(Plane.XY.offset(INTERSECT1_START)):
        Polygon((275, 0), (300, 0), (300, 50), (275, 25), align=None)
    extrude(amount=INTERSECT1_17_DEPTH)

    # Intersect1 18 outline → Intersect1 18 (add)
    with BuildSketch(Plane.XY.offset(INTERSECT1_START_10)):
        Polygon((250, 0), (275, 0), (275, 25), align=None)
    extrude(amount=INTERSECT1_18_DEPTH)

    # Intersect1 19 outline → Intersect1 19 (add)
    with BuildSketch(Plane.XY.offset(INTERSECT1_START_2)):
        with Locations((268.75, 6.25)):
            Circle(INTERSECT1_19_OUTLINE_R)
    extrude(amount=INTERSECT1_19_DEPTH)


with BuildPart() as body_5:
    # Intersect1 20 outline → Intersect1 20 (new body)
    with BuildSketch(Plane.XY.offset(INTERSECT1_START_5)):
        Polygon((275, 0), (300, 0), (300, 50), (275, 25), align=None)
    extrude(amount=INTERSECT1_20_DEPTH)

    # Intersect1 21 outline → Intersect1 21 (add)
    with BuildSketch(Plane.XY.offset(INTERSECT1_START_6)):
        with Locations((287.5, -17.5)):
            Circle(INTERSECT1_21_OUTLINE_R)
    extrude(amount=INTERSECT1_21_DEPTH)

    # Intersect1 22 outline → Intersect1 22 (add)
    with BuildSketch(Plane.XY.offset(INTERSECT1_START_6)):
        with BuildLine():
            ThreePointArc((275, -17.5), (287.5, -5), (300, -17.5))
            Line((300, -17.5), (300, 0))
            Line((300, 0), (275, 0))
            Line((275, 0), (275, -17.5))
        make_face()
    extrude(amount=INTERSECT1_22_DEPTH)

    # Intersect1 23 outline → Intersect1 23 (add)
    with BuildSketch(Plane.XY.offset(INTERSECT1_START_7)):
        with BuildLine():
            ThreePointArc((275, -17.5), (287.5, -5), (300, -17.5))
            Line((300, -17.5), (300, 0))
            Line((300, 0), (275, 0))
            Line((275, 0), (275, -17.5))
        make_face()
    extrude(amount=INTERSECT1_23_DEPTH)


with BuildPart() as body_6:
    # Intersect1 24 outline → Intersect1 24 (new body)
    with BuildSketch(Plane.YZ.offset(INTERSECT1_START_5)):
        Polygon((50, 300), (0, 300), (0, 275), (25, 275), align=None)
    extrude(amount=INTERSECT1_24_DEPTH)

    # Intersect1 25 outline → Intersect1 25 (add)
    with BuildSketch(Plane.YZ.offset(INTERSECT1_START_6)):
        with Locations((-17.5, 287.5)):
            Circle(INTERSECT1_25_OUTLINE_R)
    extrude(amount=INTERSECT1_25_DEPTH)

    # Intersect1 26 outline → Intersect1 26 (add)
    with BuildSketch(Plane.YZ.offset(INTERSECT1_START_6)):
        with BuildLine():
            ThreePointArc((-17.5, 300), (-5, 287.5), (-17.5, 275))
            Line((-17.5, 275), (0, 275))
            Line((0, 275), (0, 300))
            Line((0, 300), (-17.5, 300))
        make_face()
    extrude(amount=INTERSECT1_26_DEPTH)

    # Intersect1 27 outline → Intersect1 27 (add)
    with BuildSketch(Plane.YZ.offset(INTERSECT1_START_7)):
        with BuildLine():
            ThreePointArc((-17.5, 300), (-5, 287.5), (-17.5, 275))
            Line((-17.5, 275), (0, 275))
            Line((0, 275), (0, 300))
            Line((0, 300), (-17.5, 300))
        make_face()
    extrude(amount=INTERSECT1_27_DEPTH)

    # Sketch20 → Cut-Extrude3 (cut)
    with BuildSketch(Plane.XY.offset(300)):
        with Locations((0, -12.5)):
            Rectangle(SKETCH20_W, SKETCH20_H)
    extrude(amount=-CUT_EXTRUDE3_DEPTH, mode=Mode.SUBTRACT)


with BuildPart() as body_7:
    # Intersect1 28 outline → Intersect1 28 (new body)
    with BuildSketch(Plane.YZ.offset(INTERSECT1_START)):
        Polygon((0, 275), (25, 275), (50, 300), (0, 300), align=None)
    extrude(amount=INTERSECT1_28_DEPTH)

    # Intersect1 29 outline → Intersect1 29 (add)
    with BuildSketch(Plane.YZ.offset(INTERSECT1_START)):
        Polygon((0, 275), (0, 250), (25, 275), align=None)
    extrude(amount=INTERSECT1_29_DEPTH)

    # Intersect1 30 outline → Intersect1 30 (add)
    with BuildSketch(Plane.YZ.offset(INTERSECT1_START_2)):
        with Locations((6.25, 268.75)):
            Circle(INTERSECT1_30_OUTLINE_R)
    extrude(amount=INTERSECT1_30_DEPTH)

    # Intersect1 31 outline → Intersect1 31 (add)
    with BuildSketch(Plane.XY.offset(INTERSECT1_START_4)):
        Polygon((-275, 25), (-300, 50), (-300, 0), (-275, 0), align=None)
    extrude(amount=INTERSECT1_31_DEPTH)

    # Intersect1 32 outline → Intersect1 32 (add)
    with BuildSketch(Plane.XY.offset(INTERSECT1_START_8)):
        Polygon((-250, 0), (-275, 25), (-275, 0), align=None)
    extrude(amount=INTERSECT1_32_DEPTH)

    # Intersect1 33 outline → Intersect1 33 (add)
    with BuildSketch(Plane.XY.offset(INTERSECT1_START_9)):
        with Locations((-268.75, 6.25)):
            Circle(INTERSECT1_33_OUTLINE_R)
    extrude(amount=INTERSECT1_33_DEPTH)


with BuildPart() as body_8:
    # Intersect1 34 outline → Intersect1 34 (new body)
    with BuildSketch(Plane.XY.offset(INTERSECT1_START_4)):
        Polygon((275, 0), (300, 0), (300, 50), (275, 25), align=None)
    extrude(amount=INTERSECT1_34_DEPTH)

    # Intersect1 35 outline → Intersect1 35 (add)
    with BuildSketch(Plane.XY.offset(INTERSECT1_START_8)):
        Polygon((250, 0), (275, 0), (275, 25), align=None)
    extrude(amount=INTERSECT1_35_DEPTH)

    # Intersect1 36 outline → Intersect1 36 (add)
    with BuildSketch(Plane.XY.offset(INTERSECT1_START_9)):
        with Locations((268.75, 6.25)):
            Circle(INTERSECT1_36_OUTLINE_R)
    extrude(amount=INTERSECT1_36_DEPTH)

    # Intersect1 37 outline → Intersect1 37 (add)
    with BuildSketch(Plane.YZ.offset(INTERSECT1_START_4)):
        Polygon((0, 275), (25, 275), (50, 300), (0, 300), align=None)
    extrude(amount=INTERSECT1_37_DEPTH)

    # Intersect1 38 outline → Intersect1 38 (add)
    with BuildSketch(Plane.YZ.offset(INTERSECT1_START_8)):
        Polygon((0, 275), (0, 250), (25, 275), align=None)
    extrude(amount=INTERSECT1_38_DEPTH)

    # Intersect1 39 outline → Intersect1 39 (add)
    with BuildSketch(Plane.YZ.offset(INTERSECT1_START_9)):
        with Locations((6.25, 268.75)):
            Circle(INTERSECT1_39_OUTLINE_R)
    extrude(amount=INTERSECT1_39_DEPTH)


solid = Compound([part_1.part, body_2_2.part, body_3.part, body_4.part, body_5.part, body_6.part, body_7.part, body_8.part])
